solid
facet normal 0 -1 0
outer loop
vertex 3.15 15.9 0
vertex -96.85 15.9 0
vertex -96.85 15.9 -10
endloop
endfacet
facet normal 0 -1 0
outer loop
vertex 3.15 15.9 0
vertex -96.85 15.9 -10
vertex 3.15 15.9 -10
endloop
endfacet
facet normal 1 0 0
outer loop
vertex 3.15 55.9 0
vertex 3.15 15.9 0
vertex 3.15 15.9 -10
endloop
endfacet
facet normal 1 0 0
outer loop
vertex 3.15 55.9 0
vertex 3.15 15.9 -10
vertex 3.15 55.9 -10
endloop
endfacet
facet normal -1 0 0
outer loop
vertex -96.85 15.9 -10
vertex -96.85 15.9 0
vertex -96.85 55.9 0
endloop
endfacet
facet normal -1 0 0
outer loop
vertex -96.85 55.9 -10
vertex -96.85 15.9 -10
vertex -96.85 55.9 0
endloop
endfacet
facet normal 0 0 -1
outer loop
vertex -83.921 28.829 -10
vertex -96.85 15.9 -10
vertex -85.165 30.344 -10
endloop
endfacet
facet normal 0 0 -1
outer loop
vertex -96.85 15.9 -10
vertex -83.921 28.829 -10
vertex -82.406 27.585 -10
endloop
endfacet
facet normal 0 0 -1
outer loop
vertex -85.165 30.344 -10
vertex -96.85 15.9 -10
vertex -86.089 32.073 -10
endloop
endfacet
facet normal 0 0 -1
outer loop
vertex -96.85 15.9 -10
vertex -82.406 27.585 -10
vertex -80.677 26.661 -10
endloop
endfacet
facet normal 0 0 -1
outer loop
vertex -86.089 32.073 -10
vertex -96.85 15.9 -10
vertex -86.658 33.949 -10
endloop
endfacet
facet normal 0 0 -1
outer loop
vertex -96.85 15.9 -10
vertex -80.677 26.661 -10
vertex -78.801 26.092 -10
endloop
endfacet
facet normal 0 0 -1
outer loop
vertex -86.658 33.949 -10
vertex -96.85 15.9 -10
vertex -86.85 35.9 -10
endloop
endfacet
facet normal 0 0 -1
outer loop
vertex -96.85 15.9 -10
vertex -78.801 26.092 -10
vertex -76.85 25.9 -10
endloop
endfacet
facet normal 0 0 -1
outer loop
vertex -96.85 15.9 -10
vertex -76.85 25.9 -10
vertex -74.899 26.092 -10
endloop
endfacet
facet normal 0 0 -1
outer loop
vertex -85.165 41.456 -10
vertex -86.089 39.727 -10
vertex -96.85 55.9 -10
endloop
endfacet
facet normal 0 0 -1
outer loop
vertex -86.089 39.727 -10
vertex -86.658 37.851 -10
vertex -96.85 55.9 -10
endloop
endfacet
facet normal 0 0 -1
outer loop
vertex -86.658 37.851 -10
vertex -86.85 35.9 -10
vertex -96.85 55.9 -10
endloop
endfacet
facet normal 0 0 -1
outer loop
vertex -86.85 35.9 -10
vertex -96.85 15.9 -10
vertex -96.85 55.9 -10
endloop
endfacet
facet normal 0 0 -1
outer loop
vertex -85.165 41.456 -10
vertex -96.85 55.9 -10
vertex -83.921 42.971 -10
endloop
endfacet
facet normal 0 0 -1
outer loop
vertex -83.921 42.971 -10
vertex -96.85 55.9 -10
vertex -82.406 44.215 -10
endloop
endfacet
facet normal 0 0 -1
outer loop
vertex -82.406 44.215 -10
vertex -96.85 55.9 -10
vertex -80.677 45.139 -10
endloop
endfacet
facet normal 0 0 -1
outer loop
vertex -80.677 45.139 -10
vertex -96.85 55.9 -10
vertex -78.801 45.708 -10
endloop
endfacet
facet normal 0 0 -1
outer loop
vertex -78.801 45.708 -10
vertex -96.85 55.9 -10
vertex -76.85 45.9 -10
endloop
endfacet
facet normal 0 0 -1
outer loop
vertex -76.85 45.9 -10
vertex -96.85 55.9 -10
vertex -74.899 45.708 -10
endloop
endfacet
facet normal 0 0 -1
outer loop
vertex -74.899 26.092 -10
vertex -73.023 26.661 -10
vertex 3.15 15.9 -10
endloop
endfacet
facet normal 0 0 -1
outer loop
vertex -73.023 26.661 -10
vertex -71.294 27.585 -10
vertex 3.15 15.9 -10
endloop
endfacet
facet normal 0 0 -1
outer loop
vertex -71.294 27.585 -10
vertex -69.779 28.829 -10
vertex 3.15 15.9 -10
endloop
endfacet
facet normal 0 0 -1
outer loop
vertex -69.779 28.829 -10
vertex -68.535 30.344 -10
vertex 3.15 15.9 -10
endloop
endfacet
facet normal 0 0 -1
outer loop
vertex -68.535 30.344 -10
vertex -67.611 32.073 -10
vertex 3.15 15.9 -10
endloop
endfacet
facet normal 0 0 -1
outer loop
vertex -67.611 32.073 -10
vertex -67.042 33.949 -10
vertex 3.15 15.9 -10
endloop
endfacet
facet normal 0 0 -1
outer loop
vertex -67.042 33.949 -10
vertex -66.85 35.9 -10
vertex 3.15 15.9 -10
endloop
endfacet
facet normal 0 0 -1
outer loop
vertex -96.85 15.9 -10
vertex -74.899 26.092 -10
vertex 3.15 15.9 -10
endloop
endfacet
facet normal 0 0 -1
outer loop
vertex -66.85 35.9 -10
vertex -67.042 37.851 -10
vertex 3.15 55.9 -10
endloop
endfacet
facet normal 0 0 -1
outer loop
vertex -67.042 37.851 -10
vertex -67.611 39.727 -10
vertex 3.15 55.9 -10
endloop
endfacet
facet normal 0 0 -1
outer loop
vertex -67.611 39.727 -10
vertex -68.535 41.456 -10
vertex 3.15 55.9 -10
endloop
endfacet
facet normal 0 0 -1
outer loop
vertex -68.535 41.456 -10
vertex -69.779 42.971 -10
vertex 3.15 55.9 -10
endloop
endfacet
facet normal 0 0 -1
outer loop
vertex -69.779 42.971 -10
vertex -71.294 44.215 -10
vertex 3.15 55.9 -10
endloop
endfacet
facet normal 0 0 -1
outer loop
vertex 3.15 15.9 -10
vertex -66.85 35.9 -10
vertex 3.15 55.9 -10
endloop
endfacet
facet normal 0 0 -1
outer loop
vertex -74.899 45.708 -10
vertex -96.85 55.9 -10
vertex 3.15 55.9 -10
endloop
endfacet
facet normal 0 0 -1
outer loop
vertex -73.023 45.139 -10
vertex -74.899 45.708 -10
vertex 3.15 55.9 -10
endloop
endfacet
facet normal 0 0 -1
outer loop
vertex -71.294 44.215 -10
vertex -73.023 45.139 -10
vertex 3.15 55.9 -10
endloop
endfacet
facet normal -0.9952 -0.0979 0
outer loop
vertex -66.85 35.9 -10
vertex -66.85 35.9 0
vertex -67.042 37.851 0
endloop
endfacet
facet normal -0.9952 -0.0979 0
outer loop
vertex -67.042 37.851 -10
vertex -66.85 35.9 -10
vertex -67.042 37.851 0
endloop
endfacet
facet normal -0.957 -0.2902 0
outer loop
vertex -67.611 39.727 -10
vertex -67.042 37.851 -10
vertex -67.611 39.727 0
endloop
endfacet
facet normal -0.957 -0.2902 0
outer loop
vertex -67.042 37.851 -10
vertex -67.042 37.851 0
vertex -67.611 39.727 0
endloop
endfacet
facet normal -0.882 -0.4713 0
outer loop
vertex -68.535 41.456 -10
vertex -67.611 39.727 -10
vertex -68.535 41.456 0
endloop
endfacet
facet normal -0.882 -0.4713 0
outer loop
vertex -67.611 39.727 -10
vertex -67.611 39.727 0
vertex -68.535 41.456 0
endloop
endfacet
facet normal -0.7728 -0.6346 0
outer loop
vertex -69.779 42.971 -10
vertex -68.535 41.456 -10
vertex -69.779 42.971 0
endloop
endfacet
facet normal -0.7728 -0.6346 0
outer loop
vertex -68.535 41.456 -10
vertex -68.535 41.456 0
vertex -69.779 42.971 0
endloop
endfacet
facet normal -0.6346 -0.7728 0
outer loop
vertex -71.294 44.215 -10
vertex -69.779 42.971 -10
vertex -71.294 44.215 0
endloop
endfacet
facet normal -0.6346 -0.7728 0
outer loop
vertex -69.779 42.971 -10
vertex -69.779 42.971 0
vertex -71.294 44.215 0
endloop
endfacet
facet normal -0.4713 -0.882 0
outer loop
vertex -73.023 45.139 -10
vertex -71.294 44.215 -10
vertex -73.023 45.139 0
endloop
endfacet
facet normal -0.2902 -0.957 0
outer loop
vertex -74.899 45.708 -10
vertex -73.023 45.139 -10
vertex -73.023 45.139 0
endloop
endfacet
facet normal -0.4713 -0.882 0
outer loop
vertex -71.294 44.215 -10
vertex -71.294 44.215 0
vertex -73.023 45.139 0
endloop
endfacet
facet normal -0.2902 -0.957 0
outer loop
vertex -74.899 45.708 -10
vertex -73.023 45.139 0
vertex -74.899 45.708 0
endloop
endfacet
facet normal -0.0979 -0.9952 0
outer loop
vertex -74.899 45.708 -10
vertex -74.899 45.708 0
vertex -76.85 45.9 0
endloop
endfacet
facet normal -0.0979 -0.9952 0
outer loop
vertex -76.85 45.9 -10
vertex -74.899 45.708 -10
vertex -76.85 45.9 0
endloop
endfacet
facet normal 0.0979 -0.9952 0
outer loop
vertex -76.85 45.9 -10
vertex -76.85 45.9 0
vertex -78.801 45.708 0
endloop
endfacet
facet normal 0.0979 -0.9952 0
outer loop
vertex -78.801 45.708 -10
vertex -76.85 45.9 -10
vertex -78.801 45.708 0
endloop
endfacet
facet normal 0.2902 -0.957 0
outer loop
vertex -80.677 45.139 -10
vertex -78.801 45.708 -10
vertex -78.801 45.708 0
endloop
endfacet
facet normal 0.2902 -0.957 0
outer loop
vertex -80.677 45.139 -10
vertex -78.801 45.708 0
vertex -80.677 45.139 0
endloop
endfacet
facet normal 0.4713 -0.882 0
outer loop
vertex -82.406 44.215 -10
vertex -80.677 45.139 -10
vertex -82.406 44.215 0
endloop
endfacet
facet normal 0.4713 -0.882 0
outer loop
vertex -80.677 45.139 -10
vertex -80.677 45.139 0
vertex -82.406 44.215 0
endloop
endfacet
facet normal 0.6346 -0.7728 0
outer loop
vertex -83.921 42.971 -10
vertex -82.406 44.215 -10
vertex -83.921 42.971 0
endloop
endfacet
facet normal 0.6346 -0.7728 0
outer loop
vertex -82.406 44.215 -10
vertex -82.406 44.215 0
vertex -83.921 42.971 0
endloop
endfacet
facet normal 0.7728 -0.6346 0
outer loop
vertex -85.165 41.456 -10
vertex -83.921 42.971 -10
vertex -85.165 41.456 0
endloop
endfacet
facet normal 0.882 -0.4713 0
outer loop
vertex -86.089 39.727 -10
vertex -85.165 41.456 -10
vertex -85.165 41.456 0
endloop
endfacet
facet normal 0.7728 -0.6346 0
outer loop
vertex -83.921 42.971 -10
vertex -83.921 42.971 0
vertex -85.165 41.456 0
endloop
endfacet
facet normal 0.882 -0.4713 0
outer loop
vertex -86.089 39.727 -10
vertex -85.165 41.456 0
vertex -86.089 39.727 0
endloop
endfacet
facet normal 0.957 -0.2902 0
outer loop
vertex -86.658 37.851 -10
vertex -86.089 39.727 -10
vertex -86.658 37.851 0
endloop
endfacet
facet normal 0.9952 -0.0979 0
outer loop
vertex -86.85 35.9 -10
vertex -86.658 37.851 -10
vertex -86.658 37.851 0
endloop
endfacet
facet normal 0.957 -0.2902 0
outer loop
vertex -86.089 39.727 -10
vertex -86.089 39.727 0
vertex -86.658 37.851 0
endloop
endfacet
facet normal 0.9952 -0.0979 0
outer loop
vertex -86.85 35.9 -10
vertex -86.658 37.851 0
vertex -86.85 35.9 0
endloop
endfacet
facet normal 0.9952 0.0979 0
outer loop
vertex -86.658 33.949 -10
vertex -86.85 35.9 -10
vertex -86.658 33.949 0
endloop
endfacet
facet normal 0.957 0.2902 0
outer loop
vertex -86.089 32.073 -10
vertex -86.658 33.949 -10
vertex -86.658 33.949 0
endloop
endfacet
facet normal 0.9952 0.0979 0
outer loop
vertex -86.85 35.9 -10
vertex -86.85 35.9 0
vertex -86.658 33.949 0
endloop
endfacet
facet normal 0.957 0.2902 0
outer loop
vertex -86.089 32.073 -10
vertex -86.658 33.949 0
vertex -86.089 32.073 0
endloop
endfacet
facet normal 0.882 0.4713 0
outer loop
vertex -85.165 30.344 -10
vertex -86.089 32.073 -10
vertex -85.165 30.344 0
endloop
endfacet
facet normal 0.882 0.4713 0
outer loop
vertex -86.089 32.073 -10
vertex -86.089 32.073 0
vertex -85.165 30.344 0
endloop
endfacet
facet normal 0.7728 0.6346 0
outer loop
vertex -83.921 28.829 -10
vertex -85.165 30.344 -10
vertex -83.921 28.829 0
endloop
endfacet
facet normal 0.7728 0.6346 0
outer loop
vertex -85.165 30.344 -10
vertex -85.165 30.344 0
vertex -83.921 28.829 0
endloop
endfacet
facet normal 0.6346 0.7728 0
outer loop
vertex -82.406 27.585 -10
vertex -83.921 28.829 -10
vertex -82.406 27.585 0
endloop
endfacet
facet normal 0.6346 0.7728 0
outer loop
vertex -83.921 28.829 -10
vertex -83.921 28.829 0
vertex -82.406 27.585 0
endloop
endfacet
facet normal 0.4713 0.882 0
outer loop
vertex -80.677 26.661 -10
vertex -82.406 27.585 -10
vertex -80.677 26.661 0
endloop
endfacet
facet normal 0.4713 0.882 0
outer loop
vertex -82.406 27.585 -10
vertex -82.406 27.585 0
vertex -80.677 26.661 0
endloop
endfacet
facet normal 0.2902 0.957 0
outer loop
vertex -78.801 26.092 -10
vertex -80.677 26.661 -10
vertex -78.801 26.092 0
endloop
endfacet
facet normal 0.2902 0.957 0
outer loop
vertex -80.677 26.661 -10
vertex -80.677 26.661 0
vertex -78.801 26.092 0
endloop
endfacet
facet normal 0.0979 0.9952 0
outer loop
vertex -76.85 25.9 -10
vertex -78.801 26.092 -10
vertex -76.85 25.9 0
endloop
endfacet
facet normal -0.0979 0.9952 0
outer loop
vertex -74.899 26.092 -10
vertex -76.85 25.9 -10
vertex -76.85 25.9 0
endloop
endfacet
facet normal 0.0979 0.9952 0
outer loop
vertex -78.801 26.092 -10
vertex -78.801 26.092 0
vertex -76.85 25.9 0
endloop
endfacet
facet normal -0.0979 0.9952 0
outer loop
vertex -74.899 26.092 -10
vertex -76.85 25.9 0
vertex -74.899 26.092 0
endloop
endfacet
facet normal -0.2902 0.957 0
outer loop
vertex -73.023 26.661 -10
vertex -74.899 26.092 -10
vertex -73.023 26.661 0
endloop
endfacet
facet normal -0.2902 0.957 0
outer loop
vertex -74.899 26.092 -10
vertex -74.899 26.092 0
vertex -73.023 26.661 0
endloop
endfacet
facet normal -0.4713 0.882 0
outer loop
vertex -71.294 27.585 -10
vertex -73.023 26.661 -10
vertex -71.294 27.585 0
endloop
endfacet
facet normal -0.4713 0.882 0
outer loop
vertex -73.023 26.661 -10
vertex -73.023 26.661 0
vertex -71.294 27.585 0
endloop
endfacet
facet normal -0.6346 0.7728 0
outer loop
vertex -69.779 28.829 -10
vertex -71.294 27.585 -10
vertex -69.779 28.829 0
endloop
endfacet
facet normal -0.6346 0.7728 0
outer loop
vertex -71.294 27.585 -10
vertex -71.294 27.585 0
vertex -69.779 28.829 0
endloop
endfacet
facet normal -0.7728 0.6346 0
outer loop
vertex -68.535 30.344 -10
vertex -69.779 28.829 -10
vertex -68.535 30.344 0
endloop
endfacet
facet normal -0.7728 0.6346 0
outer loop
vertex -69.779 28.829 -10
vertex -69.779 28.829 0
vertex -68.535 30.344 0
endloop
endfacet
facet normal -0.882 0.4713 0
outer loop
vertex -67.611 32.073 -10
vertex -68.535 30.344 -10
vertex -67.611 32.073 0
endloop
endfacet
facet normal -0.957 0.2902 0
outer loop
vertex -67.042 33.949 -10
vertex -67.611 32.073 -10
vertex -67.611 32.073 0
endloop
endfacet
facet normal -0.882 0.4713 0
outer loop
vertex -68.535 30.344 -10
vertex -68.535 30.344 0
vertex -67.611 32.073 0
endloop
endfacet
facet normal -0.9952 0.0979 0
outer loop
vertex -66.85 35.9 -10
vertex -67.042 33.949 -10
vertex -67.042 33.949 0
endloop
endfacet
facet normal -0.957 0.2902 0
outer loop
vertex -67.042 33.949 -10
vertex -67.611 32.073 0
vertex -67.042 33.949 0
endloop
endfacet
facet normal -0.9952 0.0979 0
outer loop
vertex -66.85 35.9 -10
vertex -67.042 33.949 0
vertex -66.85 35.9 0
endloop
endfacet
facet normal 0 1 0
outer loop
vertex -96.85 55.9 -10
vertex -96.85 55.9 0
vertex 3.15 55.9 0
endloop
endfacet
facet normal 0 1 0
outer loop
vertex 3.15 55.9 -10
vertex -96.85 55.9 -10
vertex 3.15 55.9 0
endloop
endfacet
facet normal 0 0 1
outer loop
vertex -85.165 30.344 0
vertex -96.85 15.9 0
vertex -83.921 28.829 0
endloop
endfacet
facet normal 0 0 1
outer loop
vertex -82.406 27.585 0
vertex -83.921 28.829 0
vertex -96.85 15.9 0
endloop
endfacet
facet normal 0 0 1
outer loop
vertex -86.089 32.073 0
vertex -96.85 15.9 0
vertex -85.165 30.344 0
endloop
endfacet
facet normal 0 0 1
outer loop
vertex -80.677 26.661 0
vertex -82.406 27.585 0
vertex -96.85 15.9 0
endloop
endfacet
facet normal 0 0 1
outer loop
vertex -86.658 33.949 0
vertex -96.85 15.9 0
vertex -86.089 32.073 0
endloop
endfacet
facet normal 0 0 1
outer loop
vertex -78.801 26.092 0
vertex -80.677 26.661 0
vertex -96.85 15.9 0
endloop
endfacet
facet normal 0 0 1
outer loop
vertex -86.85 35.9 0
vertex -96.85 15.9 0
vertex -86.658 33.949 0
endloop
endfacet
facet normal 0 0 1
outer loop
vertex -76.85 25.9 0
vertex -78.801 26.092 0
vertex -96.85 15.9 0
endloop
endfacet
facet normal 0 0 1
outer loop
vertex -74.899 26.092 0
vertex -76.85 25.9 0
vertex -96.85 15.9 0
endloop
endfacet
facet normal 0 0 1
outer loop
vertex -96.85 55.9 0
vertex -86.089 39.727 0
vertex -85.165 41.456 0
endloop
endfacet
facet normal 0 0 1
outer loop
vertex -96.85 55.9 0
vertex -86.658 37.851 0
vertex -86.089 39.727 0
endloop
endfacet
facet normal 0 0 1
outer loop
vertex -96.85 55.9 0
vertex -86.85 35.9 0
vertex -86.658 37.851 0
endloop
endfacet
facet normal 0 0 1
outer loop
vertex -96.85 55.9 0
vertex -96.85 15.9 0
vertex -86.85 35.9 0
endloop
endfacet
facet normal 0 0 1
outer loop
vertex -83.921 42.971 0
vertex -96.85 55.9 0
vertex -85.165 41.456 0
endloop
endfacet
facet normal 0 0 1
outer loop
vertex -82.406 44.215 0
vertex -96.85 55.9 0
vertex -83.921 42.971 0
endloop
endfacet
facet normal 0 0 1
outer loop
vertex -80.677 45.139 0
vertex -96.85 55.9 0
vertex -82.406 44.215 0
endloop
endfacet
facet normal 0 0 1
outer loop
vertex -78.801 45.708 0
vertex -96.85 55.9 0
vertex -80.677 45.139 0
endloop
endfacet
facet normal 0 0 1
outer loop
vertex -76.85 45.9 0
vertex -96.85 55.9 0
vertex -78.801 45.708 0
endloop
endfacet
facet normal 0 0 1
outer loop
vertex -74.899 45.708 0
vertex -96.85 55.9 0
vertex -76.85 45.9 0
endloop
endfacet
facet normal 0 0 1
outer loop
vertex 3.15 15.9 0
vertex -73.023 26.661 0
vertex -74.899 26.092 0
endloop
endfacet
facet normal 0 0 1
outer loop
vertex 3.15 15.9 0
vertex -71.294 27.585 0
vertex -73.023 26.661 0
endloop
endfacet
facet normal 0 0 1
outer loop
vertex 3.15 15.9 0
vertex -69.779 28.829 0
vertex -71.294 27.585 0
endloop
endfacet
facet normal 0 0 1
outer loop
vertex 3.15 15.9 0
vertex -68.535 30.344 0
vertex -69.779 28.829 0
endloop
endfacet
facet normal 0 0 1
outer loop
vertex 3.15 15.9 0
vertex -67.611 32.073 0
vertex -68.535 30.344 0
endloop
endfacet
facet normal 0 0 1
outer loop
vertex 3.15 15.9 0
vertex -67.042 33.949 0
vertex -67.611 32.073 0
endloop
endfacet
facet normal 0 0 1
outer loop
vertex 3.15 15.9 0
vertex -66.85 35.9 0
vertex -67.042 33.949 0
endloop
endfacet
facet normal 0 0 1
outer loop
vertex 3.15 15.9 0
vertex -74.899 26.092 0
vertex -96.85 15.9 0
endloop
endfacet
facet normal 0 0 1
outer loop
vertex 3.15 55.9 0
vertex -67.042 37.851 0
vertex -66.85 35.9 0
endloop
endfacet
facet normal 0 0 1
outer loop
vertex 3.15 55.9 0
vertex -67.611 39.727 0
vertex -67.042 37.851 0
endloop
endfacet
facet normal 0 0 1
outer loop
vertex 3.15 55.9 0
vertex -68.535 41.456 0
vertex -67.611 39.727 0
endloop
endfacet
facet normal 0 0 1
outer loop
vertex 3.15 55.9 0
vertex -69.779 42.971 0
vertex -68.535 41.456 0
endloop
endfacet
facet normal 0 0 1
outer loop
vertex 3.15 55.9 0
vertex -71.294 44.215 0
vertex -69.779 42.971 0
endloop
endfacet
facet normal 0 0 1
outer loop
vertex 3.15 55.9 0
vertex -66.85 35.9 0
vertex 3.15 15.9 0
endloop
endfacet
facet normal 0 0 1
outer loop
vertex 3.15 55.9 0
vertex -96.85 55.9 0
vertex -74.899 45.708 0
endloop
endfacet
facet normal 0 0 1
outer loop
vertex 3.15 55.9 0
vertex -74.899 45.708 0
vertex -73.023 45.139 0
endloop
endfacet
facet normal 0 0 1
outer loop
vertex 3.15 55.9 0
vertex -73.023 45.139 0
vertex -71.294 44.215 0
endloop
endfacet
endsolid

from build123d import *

# Parameters (mm, degrees)
F0_W     = 100
F0_H     = 40
F0_R     = 10
F1_DEPTH = 10


with BuildPart() as f1:
    # F0 (on Top) → F1 (new body)
    with BuildSketch(Plane.XY):
        with Locations((-46.849999, 35.900001)):
            Rectangle(F0_W, F0_H)
        with Locations((-76.849999, 35.900001)):
            Circle(F0_R, mode=Mode.SUBTRACT)
    extrude(amount=-F1_DEPTH)


solid = f1.part
